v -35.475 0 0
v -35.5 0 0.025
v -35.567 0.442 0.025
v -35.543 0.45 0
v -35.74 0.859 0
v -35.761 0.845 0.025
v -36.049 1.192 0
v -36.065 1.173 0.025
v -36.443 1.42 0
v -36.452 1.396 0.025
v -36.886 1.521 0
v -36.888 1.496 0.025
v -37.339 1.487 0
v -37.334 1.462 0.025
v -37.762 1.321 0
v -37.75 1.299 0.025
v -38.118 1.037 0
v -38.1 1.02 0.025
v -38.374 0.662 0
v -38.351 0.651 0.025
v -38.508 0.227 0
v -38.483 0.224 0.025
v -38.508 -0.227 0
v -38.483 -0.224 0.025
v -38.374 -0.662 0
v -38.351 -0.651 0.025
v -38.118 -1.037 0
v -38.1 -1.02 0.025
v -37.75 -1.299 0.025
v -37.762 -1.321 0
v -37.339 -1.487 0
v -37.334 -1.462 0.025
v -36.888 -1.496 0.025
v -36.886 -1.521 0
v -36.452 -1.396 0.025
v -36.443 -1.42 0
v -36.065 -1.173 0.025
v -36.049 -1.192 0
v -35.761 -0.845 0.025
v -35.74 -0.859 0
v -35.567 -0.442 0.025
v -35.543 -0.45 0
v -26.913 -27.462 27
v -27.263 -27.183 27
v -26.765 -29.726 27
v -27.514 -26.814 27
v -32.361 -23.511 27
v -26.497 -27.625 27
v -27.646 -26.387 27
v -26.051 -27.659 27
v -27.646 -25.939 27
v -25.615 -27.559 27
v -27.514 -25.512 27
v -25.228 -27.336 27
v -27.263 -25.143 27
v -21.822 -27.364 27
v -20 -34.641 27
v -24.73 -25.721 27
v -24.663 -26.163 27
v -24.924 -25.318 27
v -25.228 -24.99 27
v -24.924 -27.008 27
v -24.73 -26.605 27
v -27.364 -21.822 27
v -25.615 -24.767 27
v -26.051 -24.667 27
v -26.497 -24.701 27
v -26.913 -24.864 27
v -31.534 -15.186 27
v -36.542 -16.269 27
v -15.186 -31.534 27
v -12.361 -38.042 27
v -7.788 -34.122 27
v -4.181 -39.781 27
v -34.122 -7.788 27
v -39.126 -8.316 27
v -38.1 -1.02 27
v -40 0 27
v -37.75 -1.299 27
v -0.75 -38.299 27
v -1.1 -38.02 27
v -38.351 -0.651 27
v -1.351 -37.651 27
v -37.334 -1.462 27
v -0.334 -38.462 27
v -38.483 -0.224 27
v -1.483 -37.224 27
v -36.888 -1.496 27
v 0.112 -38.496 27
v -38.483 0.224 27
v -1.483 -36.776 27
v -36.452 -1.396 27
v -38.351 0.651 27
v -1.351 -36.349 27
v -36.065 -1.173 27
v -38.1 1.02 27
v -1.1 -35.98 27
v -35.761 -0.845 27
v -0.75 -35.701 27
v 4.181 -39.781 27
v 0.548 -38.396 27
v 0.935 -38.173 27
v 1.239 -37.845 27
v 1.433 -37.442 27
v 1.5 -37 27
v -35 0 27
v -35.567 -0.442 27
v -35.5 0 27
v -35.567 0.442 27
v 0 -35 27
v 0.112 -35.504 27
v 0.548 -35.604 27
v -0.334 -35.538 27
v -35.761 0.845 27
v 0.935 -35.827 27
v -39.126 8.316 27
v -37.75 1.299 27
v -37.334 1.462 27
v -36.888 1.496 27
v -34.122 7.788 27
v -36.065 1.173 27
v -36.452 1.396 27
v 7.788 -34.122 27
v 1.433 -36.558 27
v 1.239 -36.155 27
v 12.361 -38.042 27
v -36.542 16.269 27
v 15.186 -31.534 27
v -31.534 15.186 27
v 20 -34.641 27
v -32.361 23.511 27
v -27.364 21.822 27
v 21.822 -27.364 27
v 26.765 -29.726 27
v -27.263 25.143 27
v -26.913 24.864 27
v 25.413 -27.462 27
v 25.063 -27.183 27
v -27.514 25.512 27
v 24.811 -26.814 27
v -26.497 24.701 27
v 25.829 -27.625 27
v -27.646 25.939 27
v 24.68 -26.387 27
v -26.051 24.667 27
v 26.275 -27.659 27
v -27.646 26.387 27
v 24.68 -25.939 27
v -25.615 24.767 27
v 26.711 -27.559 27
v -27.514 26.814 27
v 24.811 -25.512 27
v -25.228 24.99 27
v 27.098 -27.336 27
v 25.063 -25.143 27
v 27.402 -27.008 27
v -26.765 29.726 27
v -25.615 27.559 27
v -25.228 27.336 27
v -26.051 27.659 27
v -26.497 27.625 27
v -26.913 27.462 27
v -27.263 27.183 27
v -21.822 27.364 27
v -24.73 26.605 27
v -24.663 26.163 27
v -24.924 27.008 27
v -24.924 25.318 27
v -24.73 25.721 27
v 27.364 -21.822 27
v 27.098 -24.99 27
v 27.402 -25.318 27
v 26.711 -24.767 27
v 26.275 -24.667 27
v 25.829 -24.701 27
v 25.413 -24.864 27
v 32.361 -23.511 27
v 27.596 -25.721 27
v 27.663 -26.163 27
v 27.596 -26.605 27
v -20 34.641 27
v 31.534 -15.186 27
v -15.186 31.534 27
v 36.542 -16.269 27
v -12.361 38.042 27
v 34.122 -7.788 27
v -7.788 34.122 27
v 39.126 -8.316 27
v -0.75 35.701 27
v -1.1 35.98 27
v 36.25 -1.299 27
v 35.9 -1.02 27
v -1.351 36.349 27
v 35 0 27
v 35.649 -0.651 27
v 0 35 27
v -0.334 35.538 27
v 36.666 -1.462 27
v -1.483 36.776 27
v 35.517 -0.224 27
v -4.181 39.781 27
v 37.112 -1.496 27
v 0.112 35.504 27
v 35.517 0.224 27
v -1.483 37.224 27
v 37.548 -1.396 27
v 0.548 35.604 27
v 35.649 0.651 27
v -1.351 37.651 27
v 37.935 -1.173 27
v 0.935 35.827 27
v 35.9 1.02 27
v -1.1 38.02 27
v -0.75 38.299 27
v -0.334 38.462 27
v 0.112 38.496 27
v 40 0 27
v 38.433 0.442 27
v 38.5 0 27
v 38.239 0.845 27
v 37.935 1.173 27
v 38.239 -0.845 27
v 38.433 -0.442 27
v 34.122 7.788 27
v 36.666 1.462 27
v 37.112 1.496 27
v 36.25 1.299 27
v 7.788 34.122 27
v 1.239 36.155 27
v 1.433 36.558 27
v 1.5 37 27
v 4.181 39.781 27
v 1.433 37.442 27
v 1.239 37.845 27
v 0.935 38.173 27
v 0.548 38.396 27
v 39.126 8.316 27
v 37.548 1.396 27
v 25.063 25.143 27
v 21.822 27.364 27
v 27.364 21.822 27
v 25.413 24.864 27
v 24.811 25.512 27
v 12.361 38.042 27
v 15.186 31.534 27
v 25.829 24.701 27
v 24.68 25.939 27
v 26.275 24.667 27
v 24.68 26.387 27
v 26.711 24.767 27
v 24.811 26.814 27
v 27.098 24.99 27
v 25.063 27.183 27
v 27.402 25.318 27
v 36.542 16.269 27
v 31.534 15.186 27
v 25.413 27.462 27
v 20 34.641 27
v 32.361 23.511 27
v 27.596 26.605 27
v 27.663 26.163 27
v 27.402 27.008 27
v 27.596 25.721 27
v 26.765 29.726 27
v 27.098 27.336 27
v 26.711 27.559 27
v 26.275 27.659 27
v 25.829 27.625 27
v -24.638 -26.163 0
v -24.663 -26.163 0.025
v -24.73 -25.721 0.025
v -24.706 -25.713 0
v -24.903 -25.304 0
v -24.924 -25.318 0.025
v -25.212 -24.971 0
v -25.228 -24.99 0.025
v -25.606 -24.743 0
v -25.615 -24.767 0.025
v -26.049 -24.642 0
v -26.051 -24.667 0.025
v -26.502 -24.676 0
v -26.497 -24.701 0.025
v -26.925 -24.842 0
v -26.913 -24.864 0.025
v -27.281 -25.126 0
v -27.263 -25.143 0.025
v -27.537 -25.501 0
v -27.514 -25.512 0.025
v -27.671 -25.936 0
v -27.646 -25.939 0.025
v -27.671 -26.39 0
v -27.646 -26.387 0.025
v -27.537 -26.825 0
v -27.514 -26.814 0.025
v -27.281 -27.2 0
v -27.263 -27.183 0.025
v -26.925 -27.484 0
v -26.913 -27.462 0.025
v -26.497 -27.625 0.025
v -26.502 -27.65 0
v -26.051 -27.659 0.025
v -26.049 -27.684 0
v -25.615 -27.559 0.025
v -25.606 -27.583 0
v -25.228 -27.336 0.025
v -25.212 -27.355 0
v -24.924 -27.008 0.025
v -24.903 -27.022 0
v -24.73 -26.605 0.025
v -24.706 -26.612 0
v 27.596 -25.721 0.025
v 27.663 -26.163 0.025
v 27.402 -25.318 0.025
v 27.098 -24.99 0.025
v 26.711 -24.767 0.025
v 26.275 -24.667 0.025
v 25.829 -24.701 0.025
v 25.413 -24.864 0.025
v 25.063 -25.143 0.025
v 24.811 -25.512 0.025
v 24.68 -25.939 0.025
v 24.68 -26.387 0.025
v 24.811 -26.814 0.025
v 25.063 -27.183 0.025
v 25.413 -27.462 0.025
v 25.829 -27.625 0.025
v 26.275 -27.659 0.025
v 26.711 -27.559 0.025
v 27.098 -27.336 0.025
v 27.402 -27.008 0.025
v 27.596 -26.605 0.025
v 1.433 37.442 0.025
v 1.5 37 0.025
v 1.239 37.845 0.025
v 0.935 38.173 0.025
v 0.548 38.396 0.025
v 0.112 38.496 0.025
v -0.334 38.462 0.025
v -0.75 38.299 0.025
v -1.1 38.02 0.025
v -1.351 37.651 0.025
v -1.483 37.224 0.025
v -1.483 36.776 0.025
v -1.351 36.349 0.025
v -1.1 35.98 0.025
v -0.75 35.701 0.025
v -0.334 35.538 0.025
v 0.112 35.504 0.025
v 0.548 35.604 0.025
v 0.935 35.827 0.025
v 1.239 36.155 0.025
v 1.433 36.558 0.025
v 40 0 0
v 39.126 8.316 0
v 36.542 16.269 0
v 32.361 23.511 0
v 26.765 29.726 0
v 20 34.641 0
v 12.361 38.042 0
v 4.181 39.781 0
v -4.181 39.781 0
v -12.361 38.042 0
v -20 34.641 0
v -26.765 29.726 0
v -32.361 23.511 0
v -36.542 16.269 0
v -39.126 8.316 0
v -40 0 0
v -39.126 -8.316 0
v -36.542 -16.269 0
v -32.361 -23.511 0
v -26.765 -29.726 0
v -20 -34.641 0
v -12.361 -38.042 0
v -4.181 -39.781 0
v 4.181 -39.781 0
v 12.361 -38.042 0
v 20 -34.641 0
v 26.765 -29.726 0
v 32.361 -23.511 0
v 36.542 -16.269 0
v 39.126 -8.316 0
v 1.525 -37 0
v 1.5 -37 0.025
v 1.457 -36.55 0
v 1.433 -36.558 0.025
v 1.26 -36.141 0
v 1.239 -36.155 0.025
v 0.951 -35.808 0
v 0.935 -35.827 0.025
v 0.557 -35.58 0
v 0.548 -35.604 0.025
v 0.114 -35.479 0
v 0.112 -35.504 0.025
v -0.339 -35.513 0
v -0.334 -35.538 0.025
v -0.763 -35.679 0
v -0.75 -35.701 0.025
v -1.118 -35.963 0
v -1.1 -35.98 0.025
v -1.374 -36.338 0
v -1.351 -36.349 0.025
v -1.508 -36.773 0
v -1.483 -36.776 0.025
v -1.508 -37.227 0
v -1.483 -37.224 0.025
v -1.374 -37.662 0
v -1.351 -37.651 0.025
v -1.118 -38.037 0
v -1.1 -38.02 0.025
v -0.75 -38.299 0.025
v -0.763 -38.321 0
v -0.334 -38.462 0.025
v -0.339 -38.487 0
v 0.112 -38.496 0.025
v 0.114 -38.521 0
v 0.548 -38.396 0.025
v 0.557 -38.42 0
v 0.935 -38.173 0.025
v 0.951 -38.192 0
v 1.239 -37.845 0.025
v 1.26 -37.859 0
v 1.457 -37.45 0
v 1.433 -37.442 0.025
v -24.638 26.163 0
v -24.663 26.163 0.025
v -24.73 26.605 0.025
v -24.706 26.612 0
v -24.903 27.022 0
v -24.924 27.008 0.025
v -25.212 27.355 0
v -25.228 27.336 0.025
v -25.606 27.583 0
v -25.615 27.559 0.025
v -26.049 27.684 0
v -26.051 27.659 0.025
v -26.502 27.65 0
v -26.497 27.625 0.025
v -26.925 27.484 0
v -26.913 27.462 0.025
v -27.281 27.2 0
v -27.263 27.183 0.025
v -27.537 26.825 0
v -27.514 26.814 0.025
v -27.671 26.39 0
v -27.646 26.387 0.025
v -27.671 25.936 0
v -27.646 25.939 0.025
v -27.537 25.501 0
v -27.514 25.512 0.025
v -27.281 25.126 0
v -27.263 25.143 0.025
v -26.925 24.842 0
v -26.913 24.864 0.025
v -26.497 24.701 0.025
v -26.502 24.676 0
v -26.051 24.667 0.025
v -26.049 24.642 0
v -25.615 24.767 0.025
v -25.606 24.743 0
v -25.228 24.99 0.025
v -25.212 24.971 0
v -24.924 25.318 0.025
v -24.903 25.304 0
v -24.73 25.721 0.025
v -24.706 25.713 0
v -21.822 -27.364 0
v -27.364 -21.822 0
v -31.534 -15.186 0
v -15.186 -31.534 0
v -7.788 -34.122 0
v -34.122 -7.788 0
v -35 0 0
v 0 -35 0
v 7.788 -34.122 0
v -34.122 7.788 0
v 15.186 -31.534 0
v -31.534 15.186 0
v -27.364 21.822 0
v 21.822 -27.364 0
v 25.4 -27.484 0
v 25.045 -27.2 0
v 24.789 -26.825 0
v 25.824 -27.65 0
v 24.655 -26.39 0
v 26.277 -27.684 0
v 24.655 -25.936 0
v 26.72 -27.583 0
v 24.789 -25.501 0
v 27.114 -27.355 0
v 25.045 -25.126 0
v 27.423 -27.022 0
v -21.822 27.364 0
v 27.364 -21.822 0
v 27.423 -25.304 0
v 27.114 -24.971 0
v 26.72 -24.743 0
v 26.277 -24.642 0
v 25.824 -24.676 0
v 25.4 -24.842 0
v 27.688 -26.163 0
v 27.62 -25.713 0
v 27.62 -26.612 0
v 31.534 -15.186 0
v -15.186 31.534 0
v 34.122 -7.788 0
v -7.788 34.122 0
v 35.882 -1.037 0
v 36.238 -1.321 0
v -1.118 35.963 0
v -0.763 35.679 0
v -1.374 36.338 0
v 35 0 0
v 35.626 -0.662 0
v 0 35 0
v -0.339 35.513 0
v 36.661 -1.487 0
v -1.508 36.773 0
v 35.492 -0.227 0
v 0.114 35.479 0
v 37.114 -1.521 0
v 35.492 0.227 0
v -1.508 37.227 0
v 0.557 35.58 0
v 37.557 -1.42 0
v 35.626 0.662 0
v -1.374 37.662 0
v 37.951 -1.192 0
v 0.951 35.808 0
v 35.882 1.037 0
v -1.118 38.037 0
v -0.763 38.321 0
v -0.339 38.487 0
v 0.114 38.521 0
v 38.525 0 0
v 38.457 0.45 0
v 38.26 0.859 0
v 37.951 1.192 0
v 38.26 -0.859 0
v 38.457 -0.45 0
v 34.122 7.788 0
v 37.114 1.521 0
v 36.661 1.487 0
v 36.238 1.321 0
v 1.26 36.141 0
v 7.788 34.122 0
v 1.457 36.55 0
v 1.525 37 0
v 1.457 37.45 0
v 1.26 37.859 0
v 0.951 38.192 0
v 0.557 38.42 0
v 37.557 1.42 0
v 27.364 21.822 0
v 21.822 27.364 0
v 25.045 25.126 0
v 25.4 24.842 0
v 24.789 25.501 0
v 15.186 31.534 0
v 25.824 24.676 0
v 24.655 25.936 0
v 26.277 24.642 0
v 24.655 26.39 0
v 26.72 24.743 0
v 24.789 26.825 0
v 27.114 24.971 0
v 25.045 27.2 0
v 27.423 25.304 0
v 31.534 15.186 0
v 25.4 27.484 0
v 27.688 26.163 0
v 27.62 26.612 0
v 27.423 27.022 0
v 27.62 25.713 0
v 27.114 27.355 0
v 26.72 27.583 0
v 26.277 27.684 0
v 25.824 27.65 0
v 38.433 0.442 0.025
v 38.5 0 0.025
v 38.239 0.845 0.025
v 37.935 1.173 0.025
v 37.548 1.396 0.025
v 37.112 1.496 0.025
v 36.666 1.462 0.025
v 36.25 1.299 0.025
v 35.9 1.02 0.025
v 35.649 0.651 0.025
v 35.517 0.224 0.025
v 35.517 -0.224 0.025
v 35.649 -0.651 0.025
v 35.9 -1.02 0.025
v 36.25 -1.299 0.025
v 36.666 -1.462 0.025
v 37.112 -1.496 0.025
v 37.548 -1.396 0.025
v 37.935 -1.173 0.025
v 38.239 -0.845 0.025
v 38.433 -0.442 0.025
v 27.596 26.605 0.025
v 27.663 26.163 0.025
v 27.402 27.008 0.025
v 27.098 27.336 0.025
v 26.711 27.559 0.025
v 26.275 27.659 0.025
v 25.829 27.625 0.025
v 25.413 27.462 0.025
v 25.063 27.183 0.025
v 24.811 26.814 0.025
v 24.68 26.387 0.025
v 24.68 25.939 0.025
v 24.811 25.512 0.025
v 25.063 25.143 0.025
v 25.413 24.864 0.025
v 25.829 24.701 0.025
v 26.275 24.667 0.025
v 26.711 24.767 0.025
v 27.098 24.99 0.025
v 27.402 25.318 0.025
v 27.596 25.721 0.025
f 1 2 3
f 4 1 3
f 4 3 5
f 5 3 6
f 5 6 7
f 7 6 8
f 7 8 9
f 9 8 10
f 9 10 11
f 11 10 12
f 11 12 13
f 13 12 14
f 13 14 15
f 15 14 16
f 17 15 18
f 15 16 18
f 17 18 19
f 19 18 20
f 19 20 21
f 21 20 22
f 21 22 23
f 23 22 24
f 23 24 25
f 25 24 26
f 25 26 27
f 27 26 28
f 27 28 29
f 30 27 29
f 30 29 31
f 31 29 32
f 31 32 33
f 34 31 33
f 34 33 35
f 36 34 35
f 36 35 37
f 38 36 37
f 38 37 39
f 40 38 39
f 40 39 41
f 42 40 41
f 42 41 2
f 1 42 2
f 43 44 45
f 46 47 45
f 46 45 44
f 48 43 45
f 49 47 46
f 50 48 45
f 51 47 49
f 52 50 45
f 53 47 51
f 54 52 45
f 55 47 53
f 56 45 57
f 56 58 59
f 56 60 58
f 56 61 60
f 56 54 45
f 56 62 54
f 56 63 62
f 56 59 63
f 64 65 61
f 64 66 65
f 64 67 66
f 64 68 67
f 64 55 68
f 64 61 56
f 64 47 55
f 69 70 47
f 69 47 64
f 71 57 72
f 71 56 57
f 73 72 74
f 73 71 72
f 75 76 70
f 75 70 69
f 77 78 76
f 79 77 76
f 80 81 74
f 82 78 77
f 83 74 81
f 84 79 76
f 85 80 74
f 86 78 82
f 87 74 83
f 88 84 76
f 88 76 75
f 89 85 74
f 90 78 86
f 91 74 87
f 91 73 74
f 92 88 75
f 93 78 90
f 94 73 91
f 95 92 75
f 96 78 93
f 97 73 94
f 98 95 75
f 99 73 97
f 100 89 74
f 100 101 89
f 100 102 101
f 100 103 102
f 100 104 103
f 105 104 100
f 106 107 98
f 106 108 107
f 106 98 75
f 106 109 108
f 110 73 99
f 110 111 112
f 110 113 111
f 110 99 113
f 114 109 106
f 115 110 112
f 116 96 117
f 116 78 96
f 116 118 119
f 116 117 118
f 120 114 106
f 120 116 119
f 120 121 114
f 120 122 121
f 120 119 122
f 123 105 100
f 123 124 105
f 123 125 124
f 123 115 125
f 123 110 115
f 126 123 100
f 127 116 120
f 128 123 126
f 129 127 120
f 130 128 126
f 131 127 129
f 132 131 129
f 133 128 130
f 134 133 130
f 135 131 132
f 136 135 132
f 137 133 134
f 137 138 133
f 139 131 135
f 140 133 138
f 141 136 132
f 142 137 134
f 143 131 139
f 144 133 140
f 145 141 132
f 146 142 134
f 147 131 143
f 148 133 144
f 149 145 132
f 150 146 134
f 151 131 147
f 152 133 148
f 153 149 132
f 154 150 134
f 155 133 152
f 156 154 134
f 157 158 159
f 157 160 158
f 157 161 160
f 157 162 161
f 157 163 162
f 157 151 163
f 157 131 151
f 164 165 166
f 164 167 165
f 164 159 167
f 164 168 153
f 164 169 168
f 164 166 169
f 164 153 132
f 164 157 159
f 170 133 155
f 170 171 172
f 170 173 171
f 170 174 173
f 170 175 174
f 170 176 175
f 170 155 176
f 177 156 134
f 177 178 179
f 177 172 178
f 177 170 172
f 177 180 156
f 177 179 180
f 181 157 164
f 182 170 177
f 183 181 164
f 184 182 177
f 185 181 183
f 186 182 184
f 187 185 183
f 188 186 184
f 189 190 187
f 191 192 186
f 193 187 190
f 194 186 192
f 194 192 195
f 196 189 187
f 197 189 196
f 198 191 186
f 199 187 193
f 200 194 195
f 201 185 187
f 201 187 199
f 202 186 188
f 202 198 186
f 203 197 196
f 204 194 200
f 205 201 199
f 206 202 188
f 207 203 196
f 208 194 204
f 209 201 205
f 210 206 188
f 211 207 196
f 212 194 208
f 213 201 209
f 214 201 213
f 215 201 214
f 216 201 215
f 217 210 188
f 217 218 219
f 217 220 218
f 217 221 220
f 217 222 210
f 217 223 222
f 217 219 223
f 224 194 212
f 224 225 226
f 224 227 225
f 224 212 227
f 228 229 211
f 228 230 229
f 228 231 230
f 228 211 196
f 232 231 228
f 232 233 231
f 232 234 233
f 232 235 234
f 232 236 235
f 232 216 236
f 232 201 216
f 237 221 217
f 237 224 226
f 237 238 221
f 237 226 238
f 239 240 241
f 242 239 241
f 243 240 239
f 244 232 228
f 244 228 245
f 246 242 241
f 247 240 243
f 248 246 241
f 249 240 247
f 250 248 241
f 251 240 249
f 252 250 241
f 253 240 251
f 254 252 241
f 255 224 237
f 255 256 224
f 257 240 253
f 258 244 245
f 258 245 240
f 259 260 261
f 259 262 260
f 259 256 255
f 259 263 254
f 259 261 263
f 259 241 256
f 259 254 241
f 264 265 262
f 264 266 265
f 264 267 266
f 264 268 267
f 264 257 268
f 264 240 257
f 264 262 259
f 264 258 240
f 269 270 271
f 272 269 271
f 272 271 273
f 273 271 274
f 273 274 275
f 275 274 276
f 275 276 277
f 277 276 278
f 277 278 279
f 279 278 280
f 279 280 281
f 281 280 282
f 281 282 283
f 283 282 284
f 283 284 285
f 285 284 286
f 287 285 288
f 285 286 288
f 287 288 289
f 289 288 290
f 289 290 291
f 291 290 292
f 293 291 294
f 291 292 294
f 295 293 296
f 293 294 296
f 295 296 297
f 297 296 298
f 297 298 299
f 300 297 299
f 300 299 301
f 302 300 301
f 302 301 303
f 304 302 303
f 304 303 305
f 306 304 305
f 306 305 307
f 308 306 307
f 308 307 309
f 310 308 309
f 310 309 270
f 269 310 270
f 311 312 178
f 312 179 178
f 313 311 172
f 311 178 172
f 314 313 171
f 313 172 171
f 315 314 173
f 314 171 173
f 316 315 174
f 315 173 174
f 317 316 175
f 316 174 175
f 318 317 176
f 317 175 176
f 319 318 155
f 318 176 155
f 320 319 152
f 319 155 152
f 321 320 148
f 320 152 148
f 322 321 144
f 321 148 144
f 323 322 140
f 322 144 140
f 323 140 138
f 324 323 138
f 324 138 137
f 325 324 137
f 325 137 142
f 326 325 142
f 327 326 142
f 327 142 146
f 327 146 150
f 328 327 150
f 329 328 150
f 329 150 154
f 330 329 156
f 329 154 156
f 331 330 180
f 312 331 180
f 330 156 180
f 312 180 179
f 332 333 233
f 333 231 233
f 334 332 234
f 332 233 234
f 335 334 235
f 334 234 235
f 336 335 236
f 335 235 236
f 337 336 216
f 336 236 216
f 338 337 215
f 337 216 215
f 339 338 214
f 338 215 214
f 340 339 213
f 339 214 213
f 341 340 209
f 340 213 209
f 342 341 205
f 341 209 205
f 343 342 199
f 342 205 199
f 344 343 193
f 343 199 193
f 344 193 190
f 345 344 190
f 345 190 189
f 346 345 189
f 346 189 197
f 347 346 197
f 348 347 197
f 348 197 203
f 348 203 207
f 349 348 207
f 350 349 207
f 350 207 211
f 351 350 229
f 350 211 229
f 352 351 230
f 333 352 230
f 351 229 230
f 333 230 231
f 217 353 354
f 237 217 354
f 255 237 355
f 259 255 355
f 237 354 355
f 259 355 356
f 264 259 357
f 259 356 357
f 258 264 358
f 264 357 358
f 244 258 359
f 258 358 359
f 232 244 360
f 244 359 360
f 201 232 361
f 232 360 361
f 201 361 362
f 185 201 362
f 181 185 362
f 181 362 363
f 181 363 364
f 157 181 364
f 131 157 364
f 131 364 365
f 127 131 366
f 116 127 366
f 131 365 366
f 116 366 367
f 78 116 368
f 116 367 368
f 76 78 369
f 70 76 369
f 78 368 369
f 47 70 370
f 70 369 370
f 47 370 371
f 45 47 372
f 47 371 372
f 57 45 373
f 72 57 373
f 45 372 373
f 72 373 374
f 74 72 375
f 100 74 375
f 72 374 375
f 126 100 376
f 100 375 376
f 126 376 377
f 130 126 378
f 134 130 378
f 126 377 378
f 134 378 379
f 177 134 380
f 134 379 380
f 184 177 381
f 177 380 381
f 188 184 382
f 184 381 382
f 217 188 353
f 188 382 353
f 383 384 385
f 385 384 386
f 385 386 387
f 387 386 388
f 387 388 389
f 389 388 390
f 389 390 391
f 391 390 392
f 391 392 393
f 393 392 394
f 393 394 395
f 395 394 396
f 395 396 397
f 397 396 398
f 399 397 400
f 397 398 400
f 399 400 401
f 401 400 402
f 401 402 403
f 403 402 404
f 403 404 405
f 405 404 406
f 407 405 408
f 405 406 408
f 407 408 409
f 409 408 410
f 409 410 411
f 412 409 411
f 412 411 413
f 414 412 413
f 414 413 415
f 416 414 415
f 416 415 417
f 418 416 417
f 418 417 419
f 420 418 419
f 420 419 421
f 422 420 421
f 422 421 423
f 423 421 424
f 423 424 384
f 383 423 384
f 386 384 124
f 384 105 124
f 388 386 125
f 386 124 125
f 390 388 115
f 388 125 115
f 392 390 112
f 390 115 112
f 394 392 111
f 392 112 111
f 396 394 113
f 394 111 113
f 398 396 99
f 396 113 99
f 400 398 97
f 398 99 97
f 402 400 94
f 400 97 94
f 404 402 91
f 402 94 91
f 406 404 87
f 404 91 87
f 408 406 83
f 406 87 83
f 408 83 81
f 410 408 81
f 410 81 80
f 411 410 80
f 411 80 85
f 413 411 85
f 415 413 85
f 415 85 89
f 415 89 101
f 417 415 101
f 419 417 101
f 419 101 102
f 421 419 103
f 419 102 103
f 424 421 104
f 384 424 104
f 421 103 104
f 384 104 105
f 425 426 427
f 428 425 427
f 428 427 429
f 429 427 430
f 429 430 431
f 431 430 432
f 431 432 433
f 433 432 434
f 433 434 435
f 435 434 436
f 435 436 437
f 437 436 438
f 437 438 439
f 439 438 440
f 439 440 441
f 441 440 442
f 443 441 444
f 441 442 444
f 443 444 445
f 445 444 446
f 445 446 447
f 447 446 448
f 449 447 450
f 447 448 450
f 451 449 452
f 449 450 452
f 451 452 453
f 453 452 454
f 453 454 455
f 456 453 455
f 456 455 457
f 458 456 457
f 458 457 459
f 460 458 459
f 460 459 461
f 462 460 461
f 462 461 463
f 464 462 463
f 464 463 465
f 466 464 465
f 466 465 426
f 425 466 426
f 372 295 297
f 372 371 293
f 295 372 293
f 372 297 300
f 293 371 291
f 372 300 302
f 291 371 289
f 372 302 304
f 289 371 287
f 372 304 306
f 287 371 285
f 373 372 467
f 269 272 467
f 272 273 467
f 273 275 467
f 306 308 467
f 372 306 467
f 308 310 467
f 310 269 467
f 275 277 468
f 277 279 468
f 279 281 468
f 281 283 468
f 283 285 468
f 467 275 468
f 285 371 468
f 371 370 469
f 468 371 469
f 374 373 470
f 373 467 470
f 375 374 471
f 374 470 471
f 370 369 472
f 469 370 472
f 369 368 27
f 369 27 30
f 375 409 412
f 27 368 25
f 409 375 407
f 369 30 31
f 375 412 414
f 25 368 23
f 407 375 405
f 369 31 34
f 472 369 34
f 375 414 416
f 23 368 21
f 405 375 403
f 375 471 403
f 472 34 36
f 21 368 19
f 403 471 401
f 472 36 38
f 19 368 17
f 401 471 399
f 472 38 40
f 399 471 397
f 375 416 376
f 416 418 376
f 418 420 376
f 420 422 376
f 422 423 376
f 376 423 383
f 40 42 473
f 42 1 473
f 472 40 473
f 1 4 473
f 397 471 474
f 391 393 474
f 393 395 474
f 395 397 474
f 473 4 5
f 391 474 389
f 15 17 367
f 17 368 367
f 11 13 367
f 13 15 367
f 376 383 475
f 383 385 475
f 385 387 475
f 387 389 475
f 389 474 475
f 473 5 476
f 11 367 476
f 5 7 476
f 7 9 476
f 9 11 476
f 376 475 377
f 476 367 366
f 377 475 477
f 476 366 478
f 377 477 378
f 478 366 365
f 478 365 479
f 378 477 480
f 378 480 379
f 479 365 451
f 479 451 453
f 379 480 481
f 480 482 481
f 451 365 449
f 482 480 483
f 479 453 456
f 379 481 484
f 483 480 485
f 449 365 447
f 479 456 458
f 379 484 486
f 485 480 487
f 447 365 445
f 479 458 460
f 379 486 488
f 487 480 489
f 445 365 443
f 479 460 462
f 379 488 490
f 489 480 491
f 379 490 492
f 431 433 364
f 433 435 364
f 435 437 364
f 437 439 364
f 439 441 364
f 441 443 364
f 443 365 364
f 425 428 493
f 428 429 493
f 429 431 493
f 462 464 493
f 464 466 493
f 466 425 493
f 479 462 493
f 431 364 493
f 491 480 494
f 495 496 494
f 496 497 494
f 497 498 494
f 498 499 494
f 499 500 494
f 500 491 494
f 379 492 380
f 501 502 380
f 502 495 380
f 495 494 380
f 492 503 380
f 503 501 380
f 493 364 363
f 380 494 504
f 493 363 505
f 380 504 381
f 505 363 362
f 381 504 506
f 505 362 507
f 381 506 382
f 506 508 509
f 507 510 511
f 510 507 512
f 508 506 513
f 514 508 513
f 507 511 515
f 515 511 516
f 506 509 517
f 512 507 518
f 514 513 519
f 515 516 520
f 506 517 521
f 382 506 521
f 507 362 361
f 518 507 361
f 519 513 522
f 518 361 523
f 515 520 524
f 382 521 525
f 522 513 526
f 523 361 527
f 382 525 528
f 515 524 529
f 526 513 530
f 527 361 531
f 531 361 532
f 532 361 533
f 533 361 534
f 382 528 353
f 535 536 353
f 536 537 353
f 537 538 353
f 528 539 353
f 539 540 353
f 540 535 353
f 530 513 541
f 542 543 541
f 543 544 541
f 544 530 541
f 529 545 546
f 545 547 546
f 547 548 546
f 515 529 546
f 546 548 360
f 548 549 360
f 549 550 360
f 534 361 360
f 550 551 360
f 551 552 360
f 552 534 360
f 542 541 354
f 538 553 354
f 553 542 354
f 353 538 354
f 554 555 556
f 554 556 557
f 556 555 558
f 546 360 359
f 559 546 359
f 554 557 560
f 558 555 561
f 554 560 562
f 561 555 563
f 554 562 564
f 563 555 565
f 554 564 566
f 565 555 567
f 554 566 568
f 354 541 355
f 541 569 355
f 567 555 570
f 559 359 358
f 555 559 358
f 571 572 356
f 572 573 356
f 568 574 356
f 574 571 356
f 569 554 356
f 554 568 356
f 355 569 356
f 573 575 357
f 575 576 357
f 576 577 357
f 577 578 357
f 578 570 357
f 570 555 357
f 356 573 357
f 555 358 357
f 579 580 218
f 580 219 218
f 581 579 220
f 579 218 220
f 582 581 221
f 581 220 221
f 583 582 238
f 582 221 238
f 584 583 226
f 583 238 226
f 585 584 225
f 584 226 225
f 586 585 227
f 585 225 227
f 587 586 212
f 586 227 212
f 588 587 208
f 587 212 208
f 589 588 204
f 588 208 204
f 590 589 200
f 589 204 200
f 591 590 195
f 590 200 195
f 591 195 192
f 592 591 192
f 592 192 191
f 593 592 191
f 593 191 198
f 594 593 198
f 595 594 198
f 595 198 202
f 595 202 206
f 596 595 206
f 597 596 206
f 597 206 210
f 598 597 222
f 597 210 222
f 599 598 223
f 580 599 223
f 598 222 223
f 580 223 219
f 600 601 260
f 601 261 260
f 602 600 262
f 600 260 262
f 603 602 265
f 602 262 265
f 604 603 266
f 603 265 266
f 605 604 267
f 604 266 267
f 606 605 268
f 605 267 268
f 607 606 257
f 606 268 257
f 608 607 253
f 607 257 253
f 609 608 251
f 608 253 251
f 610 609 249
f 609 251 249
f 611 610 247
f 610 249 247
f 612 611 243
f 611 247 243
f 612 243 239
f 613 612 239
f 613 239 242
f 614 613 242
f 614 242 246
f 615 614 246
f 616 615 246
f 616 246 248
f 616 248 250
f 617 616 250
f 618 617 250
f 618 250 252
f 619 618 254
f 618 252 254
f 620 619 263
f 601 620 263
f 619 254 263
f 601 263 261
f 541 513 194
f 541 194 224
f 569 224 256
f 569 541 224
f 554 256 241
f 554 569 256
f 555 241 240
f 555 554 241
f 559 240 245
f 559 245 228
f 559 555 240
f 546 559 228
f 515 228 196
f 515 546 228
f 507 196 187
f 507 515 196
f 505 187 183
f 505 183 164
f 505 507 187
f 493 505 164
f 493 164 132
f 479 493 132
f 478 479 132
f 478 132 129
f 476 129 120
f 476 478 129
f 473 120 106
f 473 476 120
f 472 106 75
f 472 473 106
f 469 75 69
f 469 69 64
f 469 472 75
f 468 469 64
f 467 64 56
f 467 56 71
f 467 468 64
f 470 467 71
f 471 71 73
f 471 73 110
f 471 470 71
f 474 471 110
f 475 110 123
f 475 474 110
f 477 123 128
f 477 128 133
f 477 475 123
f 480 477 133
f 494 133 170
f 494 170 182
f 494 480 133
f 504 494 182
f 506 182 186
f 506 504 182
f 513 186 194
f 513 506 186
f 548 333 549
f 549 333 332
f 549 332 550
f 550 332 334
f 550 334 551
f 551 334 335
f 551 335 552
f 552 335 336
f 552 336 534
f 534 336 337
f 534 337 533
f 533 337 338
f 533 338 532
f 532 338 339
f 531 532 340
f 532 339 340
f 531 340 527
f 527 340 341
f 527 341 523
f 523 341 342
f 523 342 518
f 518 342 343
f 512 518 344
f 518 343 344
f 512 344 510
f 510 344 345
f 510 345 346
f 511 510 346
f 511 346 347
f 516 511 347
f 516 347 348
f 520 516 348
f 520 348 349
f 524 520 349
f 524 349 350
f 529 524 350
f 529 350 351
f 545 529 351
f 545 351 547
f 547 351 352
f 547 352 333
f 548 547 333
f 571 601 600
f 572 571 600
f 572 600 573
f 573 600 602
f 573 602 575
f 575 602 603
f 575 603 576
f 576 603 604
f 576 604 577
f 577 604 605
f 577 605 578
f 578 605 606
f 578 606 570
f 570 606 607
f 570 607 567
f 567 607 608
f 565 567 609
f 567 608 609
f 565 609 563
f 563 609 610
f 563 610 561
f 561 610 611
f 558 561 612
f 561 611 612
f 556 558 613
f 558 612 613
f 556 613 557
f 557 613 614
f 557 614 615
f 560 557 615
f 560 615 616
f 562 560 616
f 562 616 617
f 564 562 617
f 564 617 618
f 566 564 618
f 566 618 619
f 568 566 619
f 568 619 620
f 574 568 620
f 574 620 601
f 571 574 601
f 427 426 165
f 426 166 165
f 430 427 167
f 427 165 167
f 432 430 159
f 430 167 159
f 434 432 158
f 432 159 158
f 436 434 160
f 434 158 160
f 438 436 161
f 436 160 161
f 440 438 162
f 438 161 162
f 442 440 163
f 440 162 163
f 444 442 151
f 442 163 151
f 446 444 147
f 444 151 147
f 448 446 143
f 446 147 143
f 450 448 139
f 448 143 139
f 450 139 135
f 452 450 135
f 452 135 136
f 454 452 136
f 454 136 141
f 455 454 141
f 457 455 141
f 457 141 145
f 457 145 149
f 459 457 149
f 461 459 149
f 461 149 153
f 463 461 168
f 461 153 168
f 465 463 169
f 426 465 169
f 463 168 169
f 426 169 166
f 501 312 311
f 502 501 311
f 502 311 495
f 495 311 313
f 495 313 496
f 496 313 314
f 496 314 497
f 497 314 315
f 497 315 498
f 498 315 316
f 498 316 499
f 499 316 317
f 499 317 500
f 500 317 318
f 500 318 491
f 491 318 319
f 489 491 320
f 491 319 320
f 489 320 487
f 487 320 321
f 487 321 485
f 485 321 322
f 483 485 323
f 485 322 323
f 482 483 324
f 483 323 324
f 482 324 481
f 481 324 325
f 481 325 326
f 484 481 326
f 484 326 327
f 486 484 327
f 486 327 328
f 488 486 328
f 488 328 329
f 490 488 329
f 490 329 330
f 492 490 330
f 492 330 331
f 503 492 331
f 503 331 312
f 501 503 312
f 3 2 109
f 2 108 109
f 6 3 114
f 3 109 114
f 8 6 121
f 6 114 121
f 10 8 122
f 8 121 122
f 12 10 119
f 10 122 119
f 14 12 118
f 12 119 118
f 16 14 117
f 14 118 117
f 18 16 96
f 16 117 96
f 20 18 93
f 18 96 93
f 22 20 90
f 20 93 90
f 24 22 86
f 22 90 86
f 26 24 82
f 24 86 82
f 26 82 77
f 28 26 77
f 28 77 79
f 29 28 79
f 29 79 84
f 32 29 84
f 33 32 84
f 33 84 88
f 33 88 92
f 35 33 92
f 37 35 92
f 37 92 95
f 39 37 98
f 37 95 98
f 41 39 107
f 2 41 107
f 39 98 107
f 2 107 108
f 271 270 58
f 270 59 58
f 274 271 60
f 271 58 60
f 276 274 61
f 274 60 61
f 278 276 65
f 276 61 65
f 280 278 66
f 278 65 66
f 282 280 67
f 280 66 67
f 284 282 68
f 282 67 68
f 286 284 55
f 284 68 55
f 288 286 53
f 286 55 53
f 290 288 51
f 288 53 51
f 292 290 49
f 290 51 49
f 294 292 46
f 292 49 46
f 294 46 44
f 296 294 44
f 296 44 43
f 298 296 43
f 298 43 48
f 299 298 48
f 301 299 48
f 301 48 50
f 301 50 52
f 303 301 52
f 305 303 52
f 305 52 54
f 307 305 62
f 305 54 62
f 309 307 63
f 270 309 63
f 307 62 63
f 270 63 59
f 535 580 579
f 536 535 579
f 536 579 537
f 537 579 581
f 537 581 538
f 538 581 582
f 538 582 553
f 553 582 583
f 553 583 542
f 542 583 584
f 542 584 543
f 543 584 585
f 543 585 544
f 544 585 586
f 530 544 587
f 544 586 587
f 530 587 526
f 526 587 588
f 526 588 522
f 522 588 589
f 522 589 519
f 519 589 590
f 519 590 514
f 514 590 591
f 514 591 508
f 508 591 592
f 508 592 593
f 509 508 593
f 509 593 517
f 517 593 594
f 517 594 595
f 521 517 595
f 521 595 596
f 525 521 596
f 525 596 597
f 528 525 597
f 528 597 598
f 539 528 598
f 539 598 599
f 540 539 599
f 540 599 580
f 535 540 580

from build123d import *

# Parameters (mm, degrees)
SKETCH1_R                       = 40
SKETCH1_R_2                     = 35
BOSS_EXTRUDE1_DEPTH             = 27
F_3_0MM_DOWEL_HOLE1_D           = 3
F_3_0MM_DOWEL_HOLE1_CSINK_D     = 3.05
F_3_0MM_DOWEL_HOLE1_CSINK_ANGLE = 90


with BuildPart() as part:
    # Sketch1 → Boss-Extrude1 (new body)
    with BuildSketch(Plane.XY):
        Circle(SKETCH1_R)
        Circle(SKETCH1_R_2, mode=Mode.SUBTRACT)
    extrude(amount=BOSS_EXTRUDE1_DEPTH)

    # Ø3.0mm Dowel Hole1 (through all)
    with Locations(Plane(origin=(0, 0, 0), x_dir=(-1, 0, 0), z_dir=(0, 0, -1))):
        with Locations((0, 37), (26.162950904, 26.162950904), (37, 0), (-26.162950904, 26.162950904), (-37, 0), (-26.162950904, -26.162950904), (0, -37), (26.162950904, -26.162950904)):
            CounterSinkHole(F_3_0MM_DOWEL_HOLE1_D / 2, F_3_0MM_DOWEL_HOLE1_CSINK_D / 2, counter_sink_angle=F_3_0MM_DOWEL_HOLE1_CSINK_ANGLE)


solid = part.part
